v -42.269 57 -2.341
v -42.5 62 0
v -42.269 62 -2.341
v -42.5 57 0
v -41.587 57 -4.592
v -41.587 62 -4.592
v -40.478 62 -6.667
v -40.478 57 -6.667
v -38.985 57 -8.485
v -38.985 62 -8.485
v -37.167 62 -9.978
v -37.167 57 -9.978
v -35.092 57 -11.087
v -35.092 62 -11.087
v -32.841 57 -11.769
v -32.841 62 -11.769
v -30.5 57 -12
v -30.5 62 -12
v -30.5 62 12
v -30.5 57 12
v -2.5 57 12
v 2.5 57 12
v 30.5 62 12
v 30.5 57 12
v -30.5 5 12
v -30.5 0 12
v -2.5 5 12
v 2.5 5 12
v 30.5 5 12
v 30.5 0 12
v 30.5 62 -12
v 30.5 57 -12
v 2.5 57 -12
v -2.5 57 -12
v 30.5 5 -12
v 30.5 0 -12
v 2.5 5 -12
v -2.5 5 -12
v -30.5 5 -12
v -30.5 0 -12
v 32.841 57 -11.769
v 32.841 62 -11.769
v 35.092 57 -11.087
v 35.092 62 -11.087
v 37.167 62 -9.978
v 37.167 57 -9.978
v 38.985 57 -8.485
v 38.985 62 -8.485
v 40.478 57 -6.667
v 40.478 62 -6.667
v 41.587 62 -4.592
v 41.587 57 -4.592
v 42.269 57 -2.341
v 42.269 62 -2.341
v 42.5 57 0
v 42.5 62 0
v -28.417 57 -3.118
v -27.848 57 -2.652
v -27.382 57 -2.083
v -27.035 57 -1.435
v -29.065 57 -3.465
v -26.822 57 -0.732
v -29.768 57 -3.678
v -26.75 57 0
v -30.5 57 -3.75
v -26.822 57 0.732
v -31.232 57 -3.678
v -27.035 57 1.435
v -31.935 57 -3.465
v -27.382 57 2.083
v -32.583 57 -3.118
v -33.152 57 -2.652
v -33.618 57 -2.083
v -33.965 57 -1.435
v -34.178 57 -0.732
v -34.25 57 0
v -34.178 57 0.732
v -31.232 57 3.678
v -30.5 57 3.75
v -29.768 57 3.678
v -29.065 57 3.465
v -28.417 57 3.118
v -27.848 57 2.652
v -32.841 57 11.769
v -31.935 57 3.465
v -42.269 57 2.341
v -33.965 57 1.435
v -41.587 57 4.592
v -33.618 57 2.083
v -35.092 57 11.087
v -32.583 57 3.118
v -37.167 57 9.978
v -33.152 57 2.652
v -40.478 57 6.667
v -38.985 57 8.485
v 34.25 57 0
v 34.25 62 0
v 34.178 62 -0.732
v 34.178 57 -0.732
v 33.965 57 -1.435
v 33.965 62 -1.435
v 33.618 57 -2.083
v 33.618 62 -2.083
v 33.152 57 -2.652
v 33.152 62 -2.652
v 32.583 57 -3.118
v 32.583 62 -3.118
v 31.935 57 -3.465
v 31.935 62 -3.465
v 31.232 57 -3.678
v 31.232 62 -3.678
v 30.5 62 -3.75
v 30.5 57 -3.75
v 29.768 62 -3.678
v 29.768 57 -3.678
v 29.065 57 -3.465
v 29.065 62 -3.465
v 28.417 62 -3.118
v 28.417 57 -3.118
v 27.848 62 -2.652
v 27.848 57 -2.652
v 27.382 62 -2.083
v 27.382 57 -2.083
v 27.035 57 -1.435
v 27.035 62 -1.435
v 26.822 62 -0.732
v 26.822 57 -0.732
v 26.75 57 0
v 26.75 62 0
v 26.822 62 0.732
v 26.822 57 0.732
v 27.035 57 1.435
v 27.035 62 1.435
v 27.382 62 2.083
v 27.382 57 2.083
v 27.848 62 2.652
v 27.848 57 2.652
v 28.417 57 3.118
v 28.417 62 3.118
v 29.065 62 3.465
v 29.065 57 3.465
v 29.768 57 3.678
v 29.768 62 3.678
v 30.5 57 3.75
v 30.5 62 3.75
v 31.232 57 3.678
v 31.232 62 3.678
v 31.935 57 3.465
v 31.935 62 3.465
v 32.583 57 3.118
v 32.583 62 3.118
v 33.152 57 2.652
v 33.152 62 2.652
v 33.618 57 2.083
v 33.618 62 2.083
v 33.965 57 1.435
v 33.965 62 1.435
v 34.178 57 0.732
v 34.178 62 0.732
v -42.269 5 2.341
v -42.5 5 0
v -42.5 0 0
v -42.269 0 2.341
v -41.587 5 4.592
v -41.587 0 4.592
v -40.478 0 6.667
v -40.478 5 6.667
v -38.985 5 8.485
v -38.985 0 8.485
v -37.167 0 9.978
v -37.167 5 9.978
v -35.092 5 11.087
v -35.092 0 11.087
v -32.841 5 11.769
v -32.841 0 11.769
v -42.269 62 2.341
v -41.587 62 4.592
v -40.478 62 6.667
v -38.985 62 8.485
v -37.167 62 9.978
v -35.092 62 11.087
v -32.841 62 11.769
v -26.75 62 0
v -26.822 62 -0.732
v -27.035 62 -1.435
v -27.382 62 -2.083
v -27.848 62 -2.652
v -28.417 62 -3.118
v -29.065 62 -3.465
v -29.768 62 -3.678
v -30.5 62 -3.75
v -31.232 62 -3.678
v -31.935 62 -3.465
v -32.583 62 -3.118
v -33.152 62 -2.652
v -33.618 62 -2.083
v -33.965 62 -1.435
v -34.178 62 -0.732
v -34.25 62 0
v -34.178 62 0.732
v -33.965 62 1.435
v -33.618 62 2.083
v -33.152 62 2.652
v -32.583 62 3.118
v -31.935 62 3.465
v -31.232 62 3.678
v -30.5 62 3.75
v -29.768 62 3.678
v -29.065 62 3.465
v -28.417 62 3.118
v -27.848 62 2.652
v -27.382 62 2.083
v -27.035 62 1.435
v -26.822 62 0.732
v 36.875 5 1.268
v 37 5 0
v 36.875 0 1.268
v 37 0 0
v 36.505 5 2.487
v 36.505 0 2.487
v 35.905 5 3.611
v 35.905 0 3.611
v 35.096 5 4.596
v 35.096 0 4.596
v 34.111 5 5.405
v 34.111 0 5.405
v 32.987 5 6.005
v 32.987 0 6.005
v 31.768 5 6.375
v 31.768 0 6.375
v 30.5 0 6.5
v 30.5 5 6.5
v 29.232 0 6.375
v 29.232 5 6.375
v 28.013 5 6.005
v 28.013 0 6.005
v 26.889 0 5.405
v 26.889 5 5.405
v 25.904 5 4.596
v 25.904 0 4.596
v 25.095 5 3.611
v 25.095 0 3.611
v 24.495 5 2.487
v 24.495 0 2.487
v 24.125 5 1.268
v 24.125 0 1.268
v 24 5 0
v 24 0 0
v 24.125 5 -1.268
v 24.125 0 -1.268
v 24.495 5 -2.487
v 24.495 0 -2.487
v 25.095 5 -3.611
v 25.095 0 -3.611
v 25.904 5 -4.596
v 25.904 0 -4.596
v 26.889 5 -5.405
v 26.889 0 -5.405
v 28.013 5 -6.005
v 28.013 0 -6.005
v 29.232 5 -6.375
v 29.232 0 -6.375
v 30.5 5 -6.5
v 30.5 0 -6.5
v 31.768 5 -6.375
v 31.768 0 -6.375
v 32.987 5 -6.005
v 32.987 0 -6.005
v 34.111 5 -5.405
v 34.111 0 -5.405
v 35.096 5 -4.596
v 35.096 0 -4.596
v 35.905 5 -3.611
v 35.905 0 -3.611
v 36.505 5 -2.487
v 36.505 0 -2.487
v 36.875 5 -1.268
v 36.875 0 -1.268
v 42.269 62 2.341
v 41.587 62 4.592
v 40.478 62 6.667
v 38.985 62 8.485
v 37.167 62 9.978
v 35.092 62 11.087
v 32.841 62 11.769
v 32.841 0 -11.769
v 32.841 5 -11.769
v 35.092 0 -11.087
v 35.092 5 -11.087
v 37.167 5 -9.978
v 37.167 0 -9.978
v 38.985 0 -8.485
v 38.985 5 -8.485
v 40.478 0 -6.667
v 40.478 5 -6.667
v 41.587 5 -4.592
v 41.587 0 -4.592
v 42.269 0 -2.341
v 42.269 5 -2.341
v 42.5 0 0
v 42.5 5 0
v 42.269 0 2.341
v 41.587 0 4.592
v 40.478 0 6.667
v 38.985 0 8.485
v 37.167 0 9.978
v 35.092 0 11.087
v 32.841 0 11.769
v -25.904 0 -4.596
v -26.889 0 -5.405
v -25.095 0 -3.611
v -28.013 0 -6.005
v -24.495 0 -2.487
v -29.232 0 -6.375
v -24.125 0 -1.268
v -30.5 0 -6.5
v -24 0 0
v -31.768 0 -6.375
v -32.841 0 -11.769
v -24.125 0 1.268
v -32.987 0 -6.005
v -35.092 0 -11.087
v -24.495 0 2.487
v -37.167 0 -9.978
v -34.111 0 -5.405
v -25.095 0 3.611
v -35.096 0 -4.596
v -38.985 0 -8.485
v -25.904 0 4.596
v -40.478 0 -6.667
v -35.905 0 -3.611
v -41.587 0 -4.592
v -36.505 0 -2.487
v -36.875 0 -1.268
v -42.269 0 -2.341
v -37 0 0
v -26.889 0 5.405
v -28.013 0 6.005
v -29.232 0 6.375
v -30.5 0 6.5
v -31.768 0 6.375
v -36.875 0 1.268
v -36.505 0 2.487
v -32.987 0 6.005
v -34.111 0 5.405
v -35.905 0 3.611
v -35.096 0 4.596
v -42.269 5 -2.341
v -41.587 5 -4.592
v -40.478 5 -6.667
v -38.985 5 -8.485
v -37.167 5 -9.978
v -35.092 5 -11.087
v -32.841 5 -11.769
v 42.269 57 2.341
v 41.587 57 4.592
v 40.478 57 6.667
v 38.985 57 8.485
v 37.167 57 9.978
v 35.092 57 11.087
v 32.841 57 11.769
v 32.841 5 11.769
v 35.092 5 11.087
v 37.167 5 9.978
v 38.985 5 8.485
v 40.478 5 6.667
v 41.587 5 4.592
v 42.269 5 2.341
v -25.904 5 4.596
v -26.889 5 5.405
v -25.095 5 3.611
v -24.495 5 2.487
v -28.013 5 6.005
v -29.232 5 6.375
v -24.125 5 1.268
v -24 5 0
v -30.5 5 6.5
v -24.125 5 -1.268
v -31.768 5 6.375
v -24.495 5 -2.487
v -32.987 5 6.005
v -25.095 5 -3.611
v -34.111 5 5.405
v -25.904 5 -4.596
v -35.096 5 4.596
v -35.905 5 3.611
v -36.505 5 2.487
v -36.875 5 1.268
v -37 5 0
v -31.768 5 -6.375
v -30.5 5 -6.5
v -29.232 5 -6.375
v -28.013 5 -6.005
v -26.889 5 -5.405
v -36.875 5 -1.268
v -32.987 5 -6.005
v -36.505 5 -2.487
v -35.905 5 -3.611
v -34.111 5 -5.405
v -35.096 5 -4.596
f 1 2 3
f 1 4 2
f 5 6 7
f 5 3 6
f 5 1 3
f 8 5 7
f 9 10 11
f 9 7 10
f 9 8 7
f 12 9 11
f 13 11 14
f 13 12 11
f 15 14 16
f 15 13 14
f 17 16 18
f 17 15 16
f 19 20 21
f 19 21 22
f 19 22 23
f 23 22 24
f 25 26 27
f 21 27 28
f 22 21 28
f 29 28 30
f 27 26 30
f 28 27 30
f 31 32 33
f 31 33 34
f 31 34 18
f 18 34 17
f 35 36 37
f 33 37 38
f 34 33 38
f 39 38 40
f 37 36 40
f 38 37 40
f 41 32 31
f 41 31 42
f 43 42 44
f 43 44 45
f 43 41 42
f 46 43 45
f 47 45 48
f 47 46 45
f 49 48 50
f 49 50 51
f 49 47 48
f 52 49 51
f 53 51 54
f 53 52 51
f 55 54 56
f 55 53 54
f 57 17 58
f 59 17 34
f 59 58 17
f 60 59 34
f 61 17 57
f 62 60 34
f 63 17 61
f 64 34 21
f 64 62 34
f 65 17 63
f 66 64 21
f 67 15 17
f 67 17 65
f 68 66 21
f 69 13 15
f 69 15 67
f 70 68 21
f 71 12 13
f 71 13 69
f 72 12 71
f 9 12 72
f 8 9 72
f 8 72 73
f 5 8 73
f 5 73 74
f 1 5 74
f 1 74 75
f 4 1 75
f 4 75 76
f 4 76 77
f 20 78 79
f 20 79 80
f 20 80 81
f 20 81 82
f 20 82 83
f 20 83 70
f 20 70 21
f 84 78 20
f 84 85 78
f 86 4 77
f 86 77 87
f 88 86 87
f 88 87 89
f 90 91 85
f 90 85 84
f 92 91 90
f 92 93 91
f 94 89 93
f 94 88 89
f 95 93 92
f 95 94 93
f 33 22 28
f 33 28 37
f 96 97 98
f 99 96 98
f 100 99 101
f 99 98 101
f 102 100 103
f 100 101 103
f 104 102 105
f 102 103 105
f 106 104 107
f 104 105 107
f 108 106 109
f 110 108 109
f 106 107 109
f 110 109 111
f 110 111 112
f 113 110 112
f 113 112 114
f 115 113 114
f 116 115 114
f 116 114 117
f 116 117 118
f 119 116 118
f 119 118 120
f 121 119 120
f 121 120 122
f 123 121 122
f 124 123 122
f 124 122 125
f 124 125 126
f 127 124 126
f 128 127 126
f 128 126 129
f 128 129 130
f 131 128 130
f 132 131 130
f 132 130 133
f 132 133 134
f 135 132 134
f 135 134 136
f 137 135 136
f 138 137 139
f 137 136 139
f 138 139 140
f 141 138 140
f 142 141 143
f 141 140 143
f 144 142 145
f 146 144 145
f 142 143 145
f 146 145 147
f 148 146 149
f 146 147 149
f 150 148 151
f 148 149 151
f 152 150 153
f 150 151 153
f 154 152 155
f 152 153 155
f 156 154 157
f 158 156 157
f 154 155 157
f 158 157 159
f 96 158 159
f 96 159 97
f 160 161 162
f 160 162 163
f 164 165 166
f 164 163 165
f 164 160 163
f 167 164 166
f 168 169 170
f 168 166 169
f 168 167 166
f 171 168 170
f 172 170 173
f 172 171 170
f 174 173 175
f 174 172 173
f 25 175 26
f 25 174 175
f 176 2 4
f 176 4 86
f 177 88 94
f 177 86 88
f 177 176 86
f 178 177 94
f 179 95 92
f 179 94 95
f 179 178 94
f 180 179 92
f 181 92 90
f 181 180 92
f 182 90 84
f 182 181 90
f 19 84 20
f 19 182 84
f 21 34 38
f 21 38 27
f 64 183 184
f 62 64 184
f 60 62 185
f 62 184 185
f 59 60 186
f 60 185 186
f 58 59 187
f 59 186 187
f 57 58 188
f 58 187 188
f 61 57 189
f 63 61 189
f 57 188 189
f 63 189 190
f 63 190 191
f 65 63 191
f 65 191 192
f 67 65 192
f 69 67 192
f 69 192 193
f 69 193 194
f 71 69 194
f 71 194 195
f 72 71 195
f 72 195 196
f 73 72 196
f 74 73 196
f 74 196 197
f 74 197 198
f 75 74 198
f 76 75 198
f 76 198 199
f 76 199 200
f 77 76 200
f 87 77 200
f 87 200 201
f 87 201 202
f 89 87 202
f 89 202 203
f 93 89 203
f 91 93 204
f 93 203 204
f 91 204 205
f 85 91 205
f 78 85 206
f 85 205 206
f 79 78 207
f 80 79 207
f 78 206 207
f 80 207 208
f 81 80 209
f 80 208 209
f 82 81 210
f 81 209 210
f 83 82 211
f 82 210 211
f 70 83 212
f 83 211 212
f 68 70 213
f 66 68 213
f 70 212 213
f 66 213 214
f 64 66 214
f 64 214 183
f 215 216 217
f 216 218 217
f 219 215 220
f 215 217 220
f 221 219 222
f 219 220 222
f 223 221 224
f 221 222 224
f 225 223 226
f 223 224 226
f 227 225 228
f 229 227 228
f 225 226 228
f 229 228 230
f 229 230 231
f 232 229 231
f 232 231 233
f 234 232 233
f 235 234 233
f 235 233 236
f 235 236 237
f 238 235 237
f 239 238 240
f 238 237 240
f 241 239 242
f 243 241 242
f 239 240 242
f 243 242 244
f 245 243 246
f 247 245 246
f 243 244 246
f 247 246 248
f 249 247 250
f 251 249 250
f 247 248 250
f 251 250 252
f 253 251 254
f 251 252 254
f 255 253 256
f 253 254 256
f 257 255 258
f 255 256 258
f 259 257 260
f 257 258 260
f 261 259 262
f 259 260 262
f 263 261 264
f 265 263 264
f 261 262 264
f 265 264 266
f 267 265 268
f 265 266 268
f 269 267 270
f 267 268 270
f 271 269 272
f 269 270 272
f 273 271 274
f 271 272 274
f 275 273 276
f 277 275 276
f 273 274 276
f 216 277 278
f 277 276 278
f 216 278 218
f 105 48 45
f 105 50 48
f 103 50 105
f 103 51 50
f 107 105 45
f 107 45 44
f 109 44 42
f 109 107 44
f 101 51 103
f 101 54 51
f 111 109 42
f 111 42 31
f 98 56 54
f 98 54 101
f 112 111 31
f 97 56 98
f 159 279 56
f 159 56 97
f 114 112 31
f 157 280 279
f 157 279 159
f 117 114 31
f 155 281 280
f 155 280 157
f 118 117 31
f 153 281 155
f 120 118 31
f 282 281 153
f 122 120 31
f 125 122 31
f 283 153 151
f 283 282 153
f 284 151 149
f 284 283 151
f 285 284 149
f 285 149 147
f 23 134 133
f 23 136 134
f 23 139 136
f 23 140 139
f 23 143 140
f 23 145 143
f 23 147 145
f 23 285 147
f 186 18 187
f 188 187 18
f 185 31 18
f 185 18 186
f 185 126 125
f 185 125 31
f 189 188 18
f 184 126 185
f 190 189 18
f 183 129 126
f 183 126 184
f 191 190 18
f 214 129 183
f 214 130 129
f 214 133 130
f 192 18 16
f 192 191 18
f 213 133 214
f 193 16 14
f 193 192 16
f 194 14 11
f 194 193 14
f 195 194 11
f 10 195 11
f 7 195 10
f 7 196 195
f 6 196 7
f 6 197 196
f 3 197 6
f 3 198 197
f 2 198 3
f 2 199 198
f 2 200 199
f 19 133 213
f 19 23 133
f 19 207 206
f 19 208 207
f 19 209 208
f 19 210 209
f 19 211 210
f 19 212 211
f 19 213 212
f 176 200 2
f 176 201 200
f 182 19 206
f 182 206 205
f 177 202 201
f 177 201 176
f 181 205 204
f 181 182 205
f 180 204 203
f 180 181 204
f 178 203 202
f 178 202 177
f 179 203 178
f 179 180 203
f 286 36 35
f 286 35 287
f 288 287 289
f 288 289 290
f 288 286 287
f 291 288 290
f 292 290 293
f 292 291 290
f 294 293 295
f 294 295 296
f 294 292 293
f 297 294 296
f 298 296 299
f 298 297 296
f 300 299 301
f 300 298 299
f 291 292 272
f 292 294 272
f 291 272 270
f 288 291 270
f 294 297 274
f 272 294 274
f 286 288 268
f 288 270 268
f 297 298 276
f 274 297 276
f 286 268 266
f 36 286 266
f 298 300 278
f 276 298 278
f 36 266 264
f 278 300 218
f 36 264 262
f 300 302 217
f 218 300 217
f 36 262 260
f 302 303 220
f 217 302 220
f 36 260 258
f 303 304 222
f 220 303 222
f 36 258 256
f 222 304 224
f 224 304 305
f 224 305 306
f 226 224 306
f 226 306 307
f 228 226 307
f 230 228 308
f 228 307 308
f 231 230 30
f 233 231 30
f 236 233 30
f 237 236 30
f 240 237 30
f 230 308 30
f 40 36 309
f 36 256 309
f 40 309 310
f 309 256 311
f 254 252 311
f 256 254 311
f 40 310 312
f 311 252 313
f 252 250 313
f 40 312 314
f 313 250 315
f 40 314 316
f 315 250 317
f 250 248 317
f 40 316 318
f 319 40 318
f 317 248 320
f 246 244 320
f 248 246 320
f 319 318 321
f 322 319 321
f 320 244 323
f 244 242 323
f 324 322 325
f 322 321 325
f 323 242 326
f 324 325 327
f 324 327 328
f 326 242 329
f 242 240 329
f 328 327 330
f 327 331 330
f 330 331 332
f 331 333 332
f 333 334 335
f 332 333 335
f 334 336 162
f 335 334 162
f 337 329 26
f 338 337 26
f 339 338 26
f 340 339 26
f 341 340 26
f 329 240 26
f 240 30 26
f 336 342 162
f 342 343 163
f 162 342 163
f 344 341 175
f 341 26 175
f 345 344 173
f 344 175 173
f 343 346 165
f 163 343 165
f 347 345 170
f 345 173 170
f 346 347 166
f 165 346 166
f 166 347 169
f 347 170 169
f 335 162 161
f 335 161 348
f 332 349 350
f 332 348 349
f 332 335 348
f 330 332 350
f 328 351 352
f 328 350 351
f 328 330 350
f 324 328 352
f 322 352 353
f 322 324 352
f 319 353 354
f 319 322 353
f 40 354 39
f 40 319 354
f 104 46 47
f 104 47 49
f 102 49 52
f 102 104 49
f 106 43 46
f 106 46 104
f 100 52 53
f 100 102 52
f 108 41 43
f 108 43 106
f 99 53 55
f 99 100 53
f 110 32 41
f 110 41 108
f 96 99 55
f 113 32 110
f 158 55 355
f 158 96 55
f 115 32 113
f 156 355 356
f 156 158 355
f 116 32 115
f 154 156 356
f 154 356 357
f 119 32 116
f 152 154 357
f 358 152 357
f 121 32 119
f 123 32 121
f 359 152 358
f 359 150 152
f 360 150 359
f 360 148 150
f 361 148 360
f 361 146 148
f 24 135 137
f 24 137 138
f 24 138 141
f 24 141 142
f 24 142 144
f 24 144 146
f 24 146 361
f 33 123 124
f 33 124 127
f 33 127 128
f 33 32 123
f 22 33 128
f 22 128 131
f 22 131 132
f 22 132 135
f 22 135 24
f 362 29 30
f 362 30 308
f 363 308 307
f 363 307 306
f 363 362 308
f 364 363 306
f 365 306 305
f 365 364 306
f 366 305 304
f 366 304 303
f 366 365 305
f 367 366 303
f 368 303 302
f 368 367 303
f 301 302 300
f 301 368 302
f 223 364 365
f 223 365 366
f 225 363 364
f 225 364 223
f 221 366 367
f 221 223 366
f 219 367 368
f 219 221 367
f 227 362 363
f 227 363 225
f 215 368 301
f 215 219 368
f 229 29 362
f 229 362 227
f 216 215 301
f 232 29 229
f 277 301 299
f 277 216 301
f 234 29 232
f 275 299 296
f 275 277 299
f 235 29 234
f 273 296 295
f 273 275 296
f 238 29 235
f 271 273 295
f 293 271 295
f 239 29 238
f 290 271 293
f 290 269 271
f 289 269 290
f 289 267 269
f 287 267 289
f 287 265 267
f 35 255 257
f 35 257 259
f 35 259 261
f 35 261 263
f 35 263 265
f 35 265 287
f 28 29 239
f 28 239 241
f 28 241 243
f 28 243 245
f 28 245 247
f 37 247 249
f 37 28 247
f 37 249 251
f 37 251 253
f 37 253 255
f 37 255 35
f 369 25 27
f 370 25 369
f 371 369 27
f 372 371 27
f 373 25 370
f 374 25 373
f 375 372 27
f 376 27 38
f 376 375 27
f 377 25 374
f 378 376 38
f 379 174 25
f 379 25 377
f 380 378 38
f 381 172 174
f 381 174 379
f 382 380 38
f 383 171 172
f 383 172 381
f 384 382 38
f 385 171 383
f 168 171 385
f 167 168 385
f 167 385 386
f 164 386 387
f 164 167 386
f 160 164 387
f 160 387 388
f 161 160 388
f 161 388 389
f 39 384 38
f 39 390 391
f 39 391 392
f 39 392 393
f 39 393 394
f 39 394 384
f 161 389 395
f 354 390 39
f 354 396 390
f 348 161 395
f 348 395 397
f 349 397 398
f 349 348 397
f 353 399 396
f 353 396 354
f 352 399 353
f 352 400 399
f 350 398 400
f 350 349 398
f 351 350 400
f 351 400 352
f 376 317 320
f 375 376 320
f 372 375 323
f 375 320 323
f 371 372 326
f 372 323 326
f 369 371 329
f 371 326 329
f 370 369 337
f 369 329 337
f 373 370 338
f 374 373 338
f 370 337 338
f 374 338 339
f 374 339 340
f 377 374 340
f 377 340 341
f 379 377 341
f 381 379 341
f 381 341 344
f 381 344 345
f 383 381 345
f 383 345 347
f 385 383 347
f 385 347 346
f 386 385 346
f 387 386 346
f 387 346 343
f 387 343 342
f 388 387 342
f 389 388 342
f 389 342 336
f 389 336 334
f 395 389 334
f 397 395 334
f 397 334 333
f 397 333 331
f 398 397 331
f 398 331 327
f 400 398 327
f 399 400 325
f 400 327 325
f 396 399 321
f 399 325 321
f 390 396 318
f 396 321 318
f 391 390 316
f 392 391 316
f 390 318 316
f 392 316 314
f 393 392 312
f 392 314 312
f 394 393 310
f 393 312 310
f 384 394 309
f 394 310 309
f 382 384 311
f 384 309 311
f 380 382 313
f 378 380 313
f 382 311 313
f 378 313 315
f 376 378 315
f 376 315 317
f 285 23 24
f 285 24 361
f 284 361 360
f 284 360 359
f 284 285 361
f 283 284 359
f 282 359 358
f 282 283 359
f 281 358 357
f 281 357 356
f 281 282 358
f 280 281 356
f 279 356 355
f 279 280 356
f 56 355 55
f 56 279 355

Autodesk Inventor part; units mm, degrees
ref_plane "YZ Plane" through (0, 0, 0) normal (1, 0, 0) x (0, 1, 0)
ref_plane "XZ Plane" through (0, 0, 0) normal (0, 1, 0) x (-1, 0, 0)
ref_plane "XY Plane" through (0, 0, 0) normal (0, 0, 1) x (1, 0, 0)
sketch "Sketch3" plane through (0, 0, 0) normal (0, 1, 0) x (-1, 0, 0)
  line L0 (2.5, 12) -> (-2.5, 12)
  line L1 (-2.5, 12) -> (-2.5, -12)
  line L2 (-2.5, -12) -> (2.5, -12)
  line L3 (2.5, -12) -> (2.5, 12)
  point P0 (0, 0)
  point P1 (0, 12)
  point P2 (2.5, 0)
  dimension "d6" = 5
  dimension "d7" = 24
extrude "Extrusion3" add sketch "Sketch3" along normal blind 62
sketch "Sketch4" plane through (2.5, 0, 12) normal (1, 0, 0) x (0, 0, -1)
  line L0 (0, 62) -> (24, 62)
  line L1 (24, 62) -> (24, 57)
  line L2 (24, 57) -> (0, 57)
  line L3 (0, 57) -> (0, 62)
  line L4 (0, 5) -> (24, 5)
  line L5 (24, 5) -> (24, 0)
  line L6 (24, 0) -> (0, 0)
  line L7 (0, 0) -> (0, 5)
  line L8 (0, 62) -> (24, 62) projected
  line L9 (0, 0) -> (24, 0) projected
  line L10 (0, 0) -> (0, 62) projected
  point P0 (12, 0)
  point P1 (12, 62)
  point P2 (12, 0)
  point P3 (12, 57)
  point P4 (12, 62)
  point P5 (12, 5)
  point P6 (12, 0)
  point P7 (0, 59.5)
  dimension "d10" = 5
extrude "Extrusion4" add sketch "Sketch4" along normal blind 40 and the other way blind 45
fillet "Fillet4" radius 12 8 edges at (42.5, 2.5, -12) (42.5, 2.5, 12) (42.5, 59.5, 12) (42.5, 59.5, -12) (-42.5, 59.5, 12) (-42.5, 2.5, 12) (-42.5, 59.5, -12) (-42.5, 2.5, -12)
sketch "Sketch8" plane through (0, 62, 0) normal (0, 1, 0) x (1, 0, 0)
  circle A0 centre (-30.5, 0) radius 3.75
  circle A1 centre (30.5, 0) radius 3.75
  arc A2 (-30.5, 12) -> (-30.5, -12) centre (-30.5, 0) ccw projected
  arc A3 (30.5, -12) -> (30.5, 12) centre (30.5, 0) ccw projected
  point P0 (0, 0)
  dimension "d27" = 7.5
extrude "Extrusion7" cut sketch "Sketch8" against normal up to surface (5 mm away)
sketch "Sketch9" plane through (0, 0, 0) normal (0, -1, 0) x (1, 0, 0)
  circle A0 centre (-30.5, 0) radius 6.5
  circle A1 centre (30.5, 0) radius 6.5
  arc A2 (-30.5, 12) -> (-30.5, -12) centre (-30.5, 0) ccw projected
  arc A3 (30.5, -12) -> (30.5, 12) centre (30.5, 0) ccw projected
  point P0 (0, 0)
  dimension "d30" = 13
extrude "Extrusion8" cut sketch "Sketch9" against normal up to next
equation "\"d6\" = b_mat_thickness"
equation "\"d7\" = sa_diameter"
equation "\"d10\" = b_mat_thickness"
equation "\"d24\" = d11 + b_mat_thickness"
equation "\"d26\" = 0.5 * sa_diameter"
equation "\"d30\" = bb_outer_diameter"
equation "\"b_mat_thickness\" = 5"
equation "\"sa_diameter\" = 24"
equation "\"d11\" = 40"
equation "\"bb_outer_diameter\" = 13"
properties part number "Middle_leg"
